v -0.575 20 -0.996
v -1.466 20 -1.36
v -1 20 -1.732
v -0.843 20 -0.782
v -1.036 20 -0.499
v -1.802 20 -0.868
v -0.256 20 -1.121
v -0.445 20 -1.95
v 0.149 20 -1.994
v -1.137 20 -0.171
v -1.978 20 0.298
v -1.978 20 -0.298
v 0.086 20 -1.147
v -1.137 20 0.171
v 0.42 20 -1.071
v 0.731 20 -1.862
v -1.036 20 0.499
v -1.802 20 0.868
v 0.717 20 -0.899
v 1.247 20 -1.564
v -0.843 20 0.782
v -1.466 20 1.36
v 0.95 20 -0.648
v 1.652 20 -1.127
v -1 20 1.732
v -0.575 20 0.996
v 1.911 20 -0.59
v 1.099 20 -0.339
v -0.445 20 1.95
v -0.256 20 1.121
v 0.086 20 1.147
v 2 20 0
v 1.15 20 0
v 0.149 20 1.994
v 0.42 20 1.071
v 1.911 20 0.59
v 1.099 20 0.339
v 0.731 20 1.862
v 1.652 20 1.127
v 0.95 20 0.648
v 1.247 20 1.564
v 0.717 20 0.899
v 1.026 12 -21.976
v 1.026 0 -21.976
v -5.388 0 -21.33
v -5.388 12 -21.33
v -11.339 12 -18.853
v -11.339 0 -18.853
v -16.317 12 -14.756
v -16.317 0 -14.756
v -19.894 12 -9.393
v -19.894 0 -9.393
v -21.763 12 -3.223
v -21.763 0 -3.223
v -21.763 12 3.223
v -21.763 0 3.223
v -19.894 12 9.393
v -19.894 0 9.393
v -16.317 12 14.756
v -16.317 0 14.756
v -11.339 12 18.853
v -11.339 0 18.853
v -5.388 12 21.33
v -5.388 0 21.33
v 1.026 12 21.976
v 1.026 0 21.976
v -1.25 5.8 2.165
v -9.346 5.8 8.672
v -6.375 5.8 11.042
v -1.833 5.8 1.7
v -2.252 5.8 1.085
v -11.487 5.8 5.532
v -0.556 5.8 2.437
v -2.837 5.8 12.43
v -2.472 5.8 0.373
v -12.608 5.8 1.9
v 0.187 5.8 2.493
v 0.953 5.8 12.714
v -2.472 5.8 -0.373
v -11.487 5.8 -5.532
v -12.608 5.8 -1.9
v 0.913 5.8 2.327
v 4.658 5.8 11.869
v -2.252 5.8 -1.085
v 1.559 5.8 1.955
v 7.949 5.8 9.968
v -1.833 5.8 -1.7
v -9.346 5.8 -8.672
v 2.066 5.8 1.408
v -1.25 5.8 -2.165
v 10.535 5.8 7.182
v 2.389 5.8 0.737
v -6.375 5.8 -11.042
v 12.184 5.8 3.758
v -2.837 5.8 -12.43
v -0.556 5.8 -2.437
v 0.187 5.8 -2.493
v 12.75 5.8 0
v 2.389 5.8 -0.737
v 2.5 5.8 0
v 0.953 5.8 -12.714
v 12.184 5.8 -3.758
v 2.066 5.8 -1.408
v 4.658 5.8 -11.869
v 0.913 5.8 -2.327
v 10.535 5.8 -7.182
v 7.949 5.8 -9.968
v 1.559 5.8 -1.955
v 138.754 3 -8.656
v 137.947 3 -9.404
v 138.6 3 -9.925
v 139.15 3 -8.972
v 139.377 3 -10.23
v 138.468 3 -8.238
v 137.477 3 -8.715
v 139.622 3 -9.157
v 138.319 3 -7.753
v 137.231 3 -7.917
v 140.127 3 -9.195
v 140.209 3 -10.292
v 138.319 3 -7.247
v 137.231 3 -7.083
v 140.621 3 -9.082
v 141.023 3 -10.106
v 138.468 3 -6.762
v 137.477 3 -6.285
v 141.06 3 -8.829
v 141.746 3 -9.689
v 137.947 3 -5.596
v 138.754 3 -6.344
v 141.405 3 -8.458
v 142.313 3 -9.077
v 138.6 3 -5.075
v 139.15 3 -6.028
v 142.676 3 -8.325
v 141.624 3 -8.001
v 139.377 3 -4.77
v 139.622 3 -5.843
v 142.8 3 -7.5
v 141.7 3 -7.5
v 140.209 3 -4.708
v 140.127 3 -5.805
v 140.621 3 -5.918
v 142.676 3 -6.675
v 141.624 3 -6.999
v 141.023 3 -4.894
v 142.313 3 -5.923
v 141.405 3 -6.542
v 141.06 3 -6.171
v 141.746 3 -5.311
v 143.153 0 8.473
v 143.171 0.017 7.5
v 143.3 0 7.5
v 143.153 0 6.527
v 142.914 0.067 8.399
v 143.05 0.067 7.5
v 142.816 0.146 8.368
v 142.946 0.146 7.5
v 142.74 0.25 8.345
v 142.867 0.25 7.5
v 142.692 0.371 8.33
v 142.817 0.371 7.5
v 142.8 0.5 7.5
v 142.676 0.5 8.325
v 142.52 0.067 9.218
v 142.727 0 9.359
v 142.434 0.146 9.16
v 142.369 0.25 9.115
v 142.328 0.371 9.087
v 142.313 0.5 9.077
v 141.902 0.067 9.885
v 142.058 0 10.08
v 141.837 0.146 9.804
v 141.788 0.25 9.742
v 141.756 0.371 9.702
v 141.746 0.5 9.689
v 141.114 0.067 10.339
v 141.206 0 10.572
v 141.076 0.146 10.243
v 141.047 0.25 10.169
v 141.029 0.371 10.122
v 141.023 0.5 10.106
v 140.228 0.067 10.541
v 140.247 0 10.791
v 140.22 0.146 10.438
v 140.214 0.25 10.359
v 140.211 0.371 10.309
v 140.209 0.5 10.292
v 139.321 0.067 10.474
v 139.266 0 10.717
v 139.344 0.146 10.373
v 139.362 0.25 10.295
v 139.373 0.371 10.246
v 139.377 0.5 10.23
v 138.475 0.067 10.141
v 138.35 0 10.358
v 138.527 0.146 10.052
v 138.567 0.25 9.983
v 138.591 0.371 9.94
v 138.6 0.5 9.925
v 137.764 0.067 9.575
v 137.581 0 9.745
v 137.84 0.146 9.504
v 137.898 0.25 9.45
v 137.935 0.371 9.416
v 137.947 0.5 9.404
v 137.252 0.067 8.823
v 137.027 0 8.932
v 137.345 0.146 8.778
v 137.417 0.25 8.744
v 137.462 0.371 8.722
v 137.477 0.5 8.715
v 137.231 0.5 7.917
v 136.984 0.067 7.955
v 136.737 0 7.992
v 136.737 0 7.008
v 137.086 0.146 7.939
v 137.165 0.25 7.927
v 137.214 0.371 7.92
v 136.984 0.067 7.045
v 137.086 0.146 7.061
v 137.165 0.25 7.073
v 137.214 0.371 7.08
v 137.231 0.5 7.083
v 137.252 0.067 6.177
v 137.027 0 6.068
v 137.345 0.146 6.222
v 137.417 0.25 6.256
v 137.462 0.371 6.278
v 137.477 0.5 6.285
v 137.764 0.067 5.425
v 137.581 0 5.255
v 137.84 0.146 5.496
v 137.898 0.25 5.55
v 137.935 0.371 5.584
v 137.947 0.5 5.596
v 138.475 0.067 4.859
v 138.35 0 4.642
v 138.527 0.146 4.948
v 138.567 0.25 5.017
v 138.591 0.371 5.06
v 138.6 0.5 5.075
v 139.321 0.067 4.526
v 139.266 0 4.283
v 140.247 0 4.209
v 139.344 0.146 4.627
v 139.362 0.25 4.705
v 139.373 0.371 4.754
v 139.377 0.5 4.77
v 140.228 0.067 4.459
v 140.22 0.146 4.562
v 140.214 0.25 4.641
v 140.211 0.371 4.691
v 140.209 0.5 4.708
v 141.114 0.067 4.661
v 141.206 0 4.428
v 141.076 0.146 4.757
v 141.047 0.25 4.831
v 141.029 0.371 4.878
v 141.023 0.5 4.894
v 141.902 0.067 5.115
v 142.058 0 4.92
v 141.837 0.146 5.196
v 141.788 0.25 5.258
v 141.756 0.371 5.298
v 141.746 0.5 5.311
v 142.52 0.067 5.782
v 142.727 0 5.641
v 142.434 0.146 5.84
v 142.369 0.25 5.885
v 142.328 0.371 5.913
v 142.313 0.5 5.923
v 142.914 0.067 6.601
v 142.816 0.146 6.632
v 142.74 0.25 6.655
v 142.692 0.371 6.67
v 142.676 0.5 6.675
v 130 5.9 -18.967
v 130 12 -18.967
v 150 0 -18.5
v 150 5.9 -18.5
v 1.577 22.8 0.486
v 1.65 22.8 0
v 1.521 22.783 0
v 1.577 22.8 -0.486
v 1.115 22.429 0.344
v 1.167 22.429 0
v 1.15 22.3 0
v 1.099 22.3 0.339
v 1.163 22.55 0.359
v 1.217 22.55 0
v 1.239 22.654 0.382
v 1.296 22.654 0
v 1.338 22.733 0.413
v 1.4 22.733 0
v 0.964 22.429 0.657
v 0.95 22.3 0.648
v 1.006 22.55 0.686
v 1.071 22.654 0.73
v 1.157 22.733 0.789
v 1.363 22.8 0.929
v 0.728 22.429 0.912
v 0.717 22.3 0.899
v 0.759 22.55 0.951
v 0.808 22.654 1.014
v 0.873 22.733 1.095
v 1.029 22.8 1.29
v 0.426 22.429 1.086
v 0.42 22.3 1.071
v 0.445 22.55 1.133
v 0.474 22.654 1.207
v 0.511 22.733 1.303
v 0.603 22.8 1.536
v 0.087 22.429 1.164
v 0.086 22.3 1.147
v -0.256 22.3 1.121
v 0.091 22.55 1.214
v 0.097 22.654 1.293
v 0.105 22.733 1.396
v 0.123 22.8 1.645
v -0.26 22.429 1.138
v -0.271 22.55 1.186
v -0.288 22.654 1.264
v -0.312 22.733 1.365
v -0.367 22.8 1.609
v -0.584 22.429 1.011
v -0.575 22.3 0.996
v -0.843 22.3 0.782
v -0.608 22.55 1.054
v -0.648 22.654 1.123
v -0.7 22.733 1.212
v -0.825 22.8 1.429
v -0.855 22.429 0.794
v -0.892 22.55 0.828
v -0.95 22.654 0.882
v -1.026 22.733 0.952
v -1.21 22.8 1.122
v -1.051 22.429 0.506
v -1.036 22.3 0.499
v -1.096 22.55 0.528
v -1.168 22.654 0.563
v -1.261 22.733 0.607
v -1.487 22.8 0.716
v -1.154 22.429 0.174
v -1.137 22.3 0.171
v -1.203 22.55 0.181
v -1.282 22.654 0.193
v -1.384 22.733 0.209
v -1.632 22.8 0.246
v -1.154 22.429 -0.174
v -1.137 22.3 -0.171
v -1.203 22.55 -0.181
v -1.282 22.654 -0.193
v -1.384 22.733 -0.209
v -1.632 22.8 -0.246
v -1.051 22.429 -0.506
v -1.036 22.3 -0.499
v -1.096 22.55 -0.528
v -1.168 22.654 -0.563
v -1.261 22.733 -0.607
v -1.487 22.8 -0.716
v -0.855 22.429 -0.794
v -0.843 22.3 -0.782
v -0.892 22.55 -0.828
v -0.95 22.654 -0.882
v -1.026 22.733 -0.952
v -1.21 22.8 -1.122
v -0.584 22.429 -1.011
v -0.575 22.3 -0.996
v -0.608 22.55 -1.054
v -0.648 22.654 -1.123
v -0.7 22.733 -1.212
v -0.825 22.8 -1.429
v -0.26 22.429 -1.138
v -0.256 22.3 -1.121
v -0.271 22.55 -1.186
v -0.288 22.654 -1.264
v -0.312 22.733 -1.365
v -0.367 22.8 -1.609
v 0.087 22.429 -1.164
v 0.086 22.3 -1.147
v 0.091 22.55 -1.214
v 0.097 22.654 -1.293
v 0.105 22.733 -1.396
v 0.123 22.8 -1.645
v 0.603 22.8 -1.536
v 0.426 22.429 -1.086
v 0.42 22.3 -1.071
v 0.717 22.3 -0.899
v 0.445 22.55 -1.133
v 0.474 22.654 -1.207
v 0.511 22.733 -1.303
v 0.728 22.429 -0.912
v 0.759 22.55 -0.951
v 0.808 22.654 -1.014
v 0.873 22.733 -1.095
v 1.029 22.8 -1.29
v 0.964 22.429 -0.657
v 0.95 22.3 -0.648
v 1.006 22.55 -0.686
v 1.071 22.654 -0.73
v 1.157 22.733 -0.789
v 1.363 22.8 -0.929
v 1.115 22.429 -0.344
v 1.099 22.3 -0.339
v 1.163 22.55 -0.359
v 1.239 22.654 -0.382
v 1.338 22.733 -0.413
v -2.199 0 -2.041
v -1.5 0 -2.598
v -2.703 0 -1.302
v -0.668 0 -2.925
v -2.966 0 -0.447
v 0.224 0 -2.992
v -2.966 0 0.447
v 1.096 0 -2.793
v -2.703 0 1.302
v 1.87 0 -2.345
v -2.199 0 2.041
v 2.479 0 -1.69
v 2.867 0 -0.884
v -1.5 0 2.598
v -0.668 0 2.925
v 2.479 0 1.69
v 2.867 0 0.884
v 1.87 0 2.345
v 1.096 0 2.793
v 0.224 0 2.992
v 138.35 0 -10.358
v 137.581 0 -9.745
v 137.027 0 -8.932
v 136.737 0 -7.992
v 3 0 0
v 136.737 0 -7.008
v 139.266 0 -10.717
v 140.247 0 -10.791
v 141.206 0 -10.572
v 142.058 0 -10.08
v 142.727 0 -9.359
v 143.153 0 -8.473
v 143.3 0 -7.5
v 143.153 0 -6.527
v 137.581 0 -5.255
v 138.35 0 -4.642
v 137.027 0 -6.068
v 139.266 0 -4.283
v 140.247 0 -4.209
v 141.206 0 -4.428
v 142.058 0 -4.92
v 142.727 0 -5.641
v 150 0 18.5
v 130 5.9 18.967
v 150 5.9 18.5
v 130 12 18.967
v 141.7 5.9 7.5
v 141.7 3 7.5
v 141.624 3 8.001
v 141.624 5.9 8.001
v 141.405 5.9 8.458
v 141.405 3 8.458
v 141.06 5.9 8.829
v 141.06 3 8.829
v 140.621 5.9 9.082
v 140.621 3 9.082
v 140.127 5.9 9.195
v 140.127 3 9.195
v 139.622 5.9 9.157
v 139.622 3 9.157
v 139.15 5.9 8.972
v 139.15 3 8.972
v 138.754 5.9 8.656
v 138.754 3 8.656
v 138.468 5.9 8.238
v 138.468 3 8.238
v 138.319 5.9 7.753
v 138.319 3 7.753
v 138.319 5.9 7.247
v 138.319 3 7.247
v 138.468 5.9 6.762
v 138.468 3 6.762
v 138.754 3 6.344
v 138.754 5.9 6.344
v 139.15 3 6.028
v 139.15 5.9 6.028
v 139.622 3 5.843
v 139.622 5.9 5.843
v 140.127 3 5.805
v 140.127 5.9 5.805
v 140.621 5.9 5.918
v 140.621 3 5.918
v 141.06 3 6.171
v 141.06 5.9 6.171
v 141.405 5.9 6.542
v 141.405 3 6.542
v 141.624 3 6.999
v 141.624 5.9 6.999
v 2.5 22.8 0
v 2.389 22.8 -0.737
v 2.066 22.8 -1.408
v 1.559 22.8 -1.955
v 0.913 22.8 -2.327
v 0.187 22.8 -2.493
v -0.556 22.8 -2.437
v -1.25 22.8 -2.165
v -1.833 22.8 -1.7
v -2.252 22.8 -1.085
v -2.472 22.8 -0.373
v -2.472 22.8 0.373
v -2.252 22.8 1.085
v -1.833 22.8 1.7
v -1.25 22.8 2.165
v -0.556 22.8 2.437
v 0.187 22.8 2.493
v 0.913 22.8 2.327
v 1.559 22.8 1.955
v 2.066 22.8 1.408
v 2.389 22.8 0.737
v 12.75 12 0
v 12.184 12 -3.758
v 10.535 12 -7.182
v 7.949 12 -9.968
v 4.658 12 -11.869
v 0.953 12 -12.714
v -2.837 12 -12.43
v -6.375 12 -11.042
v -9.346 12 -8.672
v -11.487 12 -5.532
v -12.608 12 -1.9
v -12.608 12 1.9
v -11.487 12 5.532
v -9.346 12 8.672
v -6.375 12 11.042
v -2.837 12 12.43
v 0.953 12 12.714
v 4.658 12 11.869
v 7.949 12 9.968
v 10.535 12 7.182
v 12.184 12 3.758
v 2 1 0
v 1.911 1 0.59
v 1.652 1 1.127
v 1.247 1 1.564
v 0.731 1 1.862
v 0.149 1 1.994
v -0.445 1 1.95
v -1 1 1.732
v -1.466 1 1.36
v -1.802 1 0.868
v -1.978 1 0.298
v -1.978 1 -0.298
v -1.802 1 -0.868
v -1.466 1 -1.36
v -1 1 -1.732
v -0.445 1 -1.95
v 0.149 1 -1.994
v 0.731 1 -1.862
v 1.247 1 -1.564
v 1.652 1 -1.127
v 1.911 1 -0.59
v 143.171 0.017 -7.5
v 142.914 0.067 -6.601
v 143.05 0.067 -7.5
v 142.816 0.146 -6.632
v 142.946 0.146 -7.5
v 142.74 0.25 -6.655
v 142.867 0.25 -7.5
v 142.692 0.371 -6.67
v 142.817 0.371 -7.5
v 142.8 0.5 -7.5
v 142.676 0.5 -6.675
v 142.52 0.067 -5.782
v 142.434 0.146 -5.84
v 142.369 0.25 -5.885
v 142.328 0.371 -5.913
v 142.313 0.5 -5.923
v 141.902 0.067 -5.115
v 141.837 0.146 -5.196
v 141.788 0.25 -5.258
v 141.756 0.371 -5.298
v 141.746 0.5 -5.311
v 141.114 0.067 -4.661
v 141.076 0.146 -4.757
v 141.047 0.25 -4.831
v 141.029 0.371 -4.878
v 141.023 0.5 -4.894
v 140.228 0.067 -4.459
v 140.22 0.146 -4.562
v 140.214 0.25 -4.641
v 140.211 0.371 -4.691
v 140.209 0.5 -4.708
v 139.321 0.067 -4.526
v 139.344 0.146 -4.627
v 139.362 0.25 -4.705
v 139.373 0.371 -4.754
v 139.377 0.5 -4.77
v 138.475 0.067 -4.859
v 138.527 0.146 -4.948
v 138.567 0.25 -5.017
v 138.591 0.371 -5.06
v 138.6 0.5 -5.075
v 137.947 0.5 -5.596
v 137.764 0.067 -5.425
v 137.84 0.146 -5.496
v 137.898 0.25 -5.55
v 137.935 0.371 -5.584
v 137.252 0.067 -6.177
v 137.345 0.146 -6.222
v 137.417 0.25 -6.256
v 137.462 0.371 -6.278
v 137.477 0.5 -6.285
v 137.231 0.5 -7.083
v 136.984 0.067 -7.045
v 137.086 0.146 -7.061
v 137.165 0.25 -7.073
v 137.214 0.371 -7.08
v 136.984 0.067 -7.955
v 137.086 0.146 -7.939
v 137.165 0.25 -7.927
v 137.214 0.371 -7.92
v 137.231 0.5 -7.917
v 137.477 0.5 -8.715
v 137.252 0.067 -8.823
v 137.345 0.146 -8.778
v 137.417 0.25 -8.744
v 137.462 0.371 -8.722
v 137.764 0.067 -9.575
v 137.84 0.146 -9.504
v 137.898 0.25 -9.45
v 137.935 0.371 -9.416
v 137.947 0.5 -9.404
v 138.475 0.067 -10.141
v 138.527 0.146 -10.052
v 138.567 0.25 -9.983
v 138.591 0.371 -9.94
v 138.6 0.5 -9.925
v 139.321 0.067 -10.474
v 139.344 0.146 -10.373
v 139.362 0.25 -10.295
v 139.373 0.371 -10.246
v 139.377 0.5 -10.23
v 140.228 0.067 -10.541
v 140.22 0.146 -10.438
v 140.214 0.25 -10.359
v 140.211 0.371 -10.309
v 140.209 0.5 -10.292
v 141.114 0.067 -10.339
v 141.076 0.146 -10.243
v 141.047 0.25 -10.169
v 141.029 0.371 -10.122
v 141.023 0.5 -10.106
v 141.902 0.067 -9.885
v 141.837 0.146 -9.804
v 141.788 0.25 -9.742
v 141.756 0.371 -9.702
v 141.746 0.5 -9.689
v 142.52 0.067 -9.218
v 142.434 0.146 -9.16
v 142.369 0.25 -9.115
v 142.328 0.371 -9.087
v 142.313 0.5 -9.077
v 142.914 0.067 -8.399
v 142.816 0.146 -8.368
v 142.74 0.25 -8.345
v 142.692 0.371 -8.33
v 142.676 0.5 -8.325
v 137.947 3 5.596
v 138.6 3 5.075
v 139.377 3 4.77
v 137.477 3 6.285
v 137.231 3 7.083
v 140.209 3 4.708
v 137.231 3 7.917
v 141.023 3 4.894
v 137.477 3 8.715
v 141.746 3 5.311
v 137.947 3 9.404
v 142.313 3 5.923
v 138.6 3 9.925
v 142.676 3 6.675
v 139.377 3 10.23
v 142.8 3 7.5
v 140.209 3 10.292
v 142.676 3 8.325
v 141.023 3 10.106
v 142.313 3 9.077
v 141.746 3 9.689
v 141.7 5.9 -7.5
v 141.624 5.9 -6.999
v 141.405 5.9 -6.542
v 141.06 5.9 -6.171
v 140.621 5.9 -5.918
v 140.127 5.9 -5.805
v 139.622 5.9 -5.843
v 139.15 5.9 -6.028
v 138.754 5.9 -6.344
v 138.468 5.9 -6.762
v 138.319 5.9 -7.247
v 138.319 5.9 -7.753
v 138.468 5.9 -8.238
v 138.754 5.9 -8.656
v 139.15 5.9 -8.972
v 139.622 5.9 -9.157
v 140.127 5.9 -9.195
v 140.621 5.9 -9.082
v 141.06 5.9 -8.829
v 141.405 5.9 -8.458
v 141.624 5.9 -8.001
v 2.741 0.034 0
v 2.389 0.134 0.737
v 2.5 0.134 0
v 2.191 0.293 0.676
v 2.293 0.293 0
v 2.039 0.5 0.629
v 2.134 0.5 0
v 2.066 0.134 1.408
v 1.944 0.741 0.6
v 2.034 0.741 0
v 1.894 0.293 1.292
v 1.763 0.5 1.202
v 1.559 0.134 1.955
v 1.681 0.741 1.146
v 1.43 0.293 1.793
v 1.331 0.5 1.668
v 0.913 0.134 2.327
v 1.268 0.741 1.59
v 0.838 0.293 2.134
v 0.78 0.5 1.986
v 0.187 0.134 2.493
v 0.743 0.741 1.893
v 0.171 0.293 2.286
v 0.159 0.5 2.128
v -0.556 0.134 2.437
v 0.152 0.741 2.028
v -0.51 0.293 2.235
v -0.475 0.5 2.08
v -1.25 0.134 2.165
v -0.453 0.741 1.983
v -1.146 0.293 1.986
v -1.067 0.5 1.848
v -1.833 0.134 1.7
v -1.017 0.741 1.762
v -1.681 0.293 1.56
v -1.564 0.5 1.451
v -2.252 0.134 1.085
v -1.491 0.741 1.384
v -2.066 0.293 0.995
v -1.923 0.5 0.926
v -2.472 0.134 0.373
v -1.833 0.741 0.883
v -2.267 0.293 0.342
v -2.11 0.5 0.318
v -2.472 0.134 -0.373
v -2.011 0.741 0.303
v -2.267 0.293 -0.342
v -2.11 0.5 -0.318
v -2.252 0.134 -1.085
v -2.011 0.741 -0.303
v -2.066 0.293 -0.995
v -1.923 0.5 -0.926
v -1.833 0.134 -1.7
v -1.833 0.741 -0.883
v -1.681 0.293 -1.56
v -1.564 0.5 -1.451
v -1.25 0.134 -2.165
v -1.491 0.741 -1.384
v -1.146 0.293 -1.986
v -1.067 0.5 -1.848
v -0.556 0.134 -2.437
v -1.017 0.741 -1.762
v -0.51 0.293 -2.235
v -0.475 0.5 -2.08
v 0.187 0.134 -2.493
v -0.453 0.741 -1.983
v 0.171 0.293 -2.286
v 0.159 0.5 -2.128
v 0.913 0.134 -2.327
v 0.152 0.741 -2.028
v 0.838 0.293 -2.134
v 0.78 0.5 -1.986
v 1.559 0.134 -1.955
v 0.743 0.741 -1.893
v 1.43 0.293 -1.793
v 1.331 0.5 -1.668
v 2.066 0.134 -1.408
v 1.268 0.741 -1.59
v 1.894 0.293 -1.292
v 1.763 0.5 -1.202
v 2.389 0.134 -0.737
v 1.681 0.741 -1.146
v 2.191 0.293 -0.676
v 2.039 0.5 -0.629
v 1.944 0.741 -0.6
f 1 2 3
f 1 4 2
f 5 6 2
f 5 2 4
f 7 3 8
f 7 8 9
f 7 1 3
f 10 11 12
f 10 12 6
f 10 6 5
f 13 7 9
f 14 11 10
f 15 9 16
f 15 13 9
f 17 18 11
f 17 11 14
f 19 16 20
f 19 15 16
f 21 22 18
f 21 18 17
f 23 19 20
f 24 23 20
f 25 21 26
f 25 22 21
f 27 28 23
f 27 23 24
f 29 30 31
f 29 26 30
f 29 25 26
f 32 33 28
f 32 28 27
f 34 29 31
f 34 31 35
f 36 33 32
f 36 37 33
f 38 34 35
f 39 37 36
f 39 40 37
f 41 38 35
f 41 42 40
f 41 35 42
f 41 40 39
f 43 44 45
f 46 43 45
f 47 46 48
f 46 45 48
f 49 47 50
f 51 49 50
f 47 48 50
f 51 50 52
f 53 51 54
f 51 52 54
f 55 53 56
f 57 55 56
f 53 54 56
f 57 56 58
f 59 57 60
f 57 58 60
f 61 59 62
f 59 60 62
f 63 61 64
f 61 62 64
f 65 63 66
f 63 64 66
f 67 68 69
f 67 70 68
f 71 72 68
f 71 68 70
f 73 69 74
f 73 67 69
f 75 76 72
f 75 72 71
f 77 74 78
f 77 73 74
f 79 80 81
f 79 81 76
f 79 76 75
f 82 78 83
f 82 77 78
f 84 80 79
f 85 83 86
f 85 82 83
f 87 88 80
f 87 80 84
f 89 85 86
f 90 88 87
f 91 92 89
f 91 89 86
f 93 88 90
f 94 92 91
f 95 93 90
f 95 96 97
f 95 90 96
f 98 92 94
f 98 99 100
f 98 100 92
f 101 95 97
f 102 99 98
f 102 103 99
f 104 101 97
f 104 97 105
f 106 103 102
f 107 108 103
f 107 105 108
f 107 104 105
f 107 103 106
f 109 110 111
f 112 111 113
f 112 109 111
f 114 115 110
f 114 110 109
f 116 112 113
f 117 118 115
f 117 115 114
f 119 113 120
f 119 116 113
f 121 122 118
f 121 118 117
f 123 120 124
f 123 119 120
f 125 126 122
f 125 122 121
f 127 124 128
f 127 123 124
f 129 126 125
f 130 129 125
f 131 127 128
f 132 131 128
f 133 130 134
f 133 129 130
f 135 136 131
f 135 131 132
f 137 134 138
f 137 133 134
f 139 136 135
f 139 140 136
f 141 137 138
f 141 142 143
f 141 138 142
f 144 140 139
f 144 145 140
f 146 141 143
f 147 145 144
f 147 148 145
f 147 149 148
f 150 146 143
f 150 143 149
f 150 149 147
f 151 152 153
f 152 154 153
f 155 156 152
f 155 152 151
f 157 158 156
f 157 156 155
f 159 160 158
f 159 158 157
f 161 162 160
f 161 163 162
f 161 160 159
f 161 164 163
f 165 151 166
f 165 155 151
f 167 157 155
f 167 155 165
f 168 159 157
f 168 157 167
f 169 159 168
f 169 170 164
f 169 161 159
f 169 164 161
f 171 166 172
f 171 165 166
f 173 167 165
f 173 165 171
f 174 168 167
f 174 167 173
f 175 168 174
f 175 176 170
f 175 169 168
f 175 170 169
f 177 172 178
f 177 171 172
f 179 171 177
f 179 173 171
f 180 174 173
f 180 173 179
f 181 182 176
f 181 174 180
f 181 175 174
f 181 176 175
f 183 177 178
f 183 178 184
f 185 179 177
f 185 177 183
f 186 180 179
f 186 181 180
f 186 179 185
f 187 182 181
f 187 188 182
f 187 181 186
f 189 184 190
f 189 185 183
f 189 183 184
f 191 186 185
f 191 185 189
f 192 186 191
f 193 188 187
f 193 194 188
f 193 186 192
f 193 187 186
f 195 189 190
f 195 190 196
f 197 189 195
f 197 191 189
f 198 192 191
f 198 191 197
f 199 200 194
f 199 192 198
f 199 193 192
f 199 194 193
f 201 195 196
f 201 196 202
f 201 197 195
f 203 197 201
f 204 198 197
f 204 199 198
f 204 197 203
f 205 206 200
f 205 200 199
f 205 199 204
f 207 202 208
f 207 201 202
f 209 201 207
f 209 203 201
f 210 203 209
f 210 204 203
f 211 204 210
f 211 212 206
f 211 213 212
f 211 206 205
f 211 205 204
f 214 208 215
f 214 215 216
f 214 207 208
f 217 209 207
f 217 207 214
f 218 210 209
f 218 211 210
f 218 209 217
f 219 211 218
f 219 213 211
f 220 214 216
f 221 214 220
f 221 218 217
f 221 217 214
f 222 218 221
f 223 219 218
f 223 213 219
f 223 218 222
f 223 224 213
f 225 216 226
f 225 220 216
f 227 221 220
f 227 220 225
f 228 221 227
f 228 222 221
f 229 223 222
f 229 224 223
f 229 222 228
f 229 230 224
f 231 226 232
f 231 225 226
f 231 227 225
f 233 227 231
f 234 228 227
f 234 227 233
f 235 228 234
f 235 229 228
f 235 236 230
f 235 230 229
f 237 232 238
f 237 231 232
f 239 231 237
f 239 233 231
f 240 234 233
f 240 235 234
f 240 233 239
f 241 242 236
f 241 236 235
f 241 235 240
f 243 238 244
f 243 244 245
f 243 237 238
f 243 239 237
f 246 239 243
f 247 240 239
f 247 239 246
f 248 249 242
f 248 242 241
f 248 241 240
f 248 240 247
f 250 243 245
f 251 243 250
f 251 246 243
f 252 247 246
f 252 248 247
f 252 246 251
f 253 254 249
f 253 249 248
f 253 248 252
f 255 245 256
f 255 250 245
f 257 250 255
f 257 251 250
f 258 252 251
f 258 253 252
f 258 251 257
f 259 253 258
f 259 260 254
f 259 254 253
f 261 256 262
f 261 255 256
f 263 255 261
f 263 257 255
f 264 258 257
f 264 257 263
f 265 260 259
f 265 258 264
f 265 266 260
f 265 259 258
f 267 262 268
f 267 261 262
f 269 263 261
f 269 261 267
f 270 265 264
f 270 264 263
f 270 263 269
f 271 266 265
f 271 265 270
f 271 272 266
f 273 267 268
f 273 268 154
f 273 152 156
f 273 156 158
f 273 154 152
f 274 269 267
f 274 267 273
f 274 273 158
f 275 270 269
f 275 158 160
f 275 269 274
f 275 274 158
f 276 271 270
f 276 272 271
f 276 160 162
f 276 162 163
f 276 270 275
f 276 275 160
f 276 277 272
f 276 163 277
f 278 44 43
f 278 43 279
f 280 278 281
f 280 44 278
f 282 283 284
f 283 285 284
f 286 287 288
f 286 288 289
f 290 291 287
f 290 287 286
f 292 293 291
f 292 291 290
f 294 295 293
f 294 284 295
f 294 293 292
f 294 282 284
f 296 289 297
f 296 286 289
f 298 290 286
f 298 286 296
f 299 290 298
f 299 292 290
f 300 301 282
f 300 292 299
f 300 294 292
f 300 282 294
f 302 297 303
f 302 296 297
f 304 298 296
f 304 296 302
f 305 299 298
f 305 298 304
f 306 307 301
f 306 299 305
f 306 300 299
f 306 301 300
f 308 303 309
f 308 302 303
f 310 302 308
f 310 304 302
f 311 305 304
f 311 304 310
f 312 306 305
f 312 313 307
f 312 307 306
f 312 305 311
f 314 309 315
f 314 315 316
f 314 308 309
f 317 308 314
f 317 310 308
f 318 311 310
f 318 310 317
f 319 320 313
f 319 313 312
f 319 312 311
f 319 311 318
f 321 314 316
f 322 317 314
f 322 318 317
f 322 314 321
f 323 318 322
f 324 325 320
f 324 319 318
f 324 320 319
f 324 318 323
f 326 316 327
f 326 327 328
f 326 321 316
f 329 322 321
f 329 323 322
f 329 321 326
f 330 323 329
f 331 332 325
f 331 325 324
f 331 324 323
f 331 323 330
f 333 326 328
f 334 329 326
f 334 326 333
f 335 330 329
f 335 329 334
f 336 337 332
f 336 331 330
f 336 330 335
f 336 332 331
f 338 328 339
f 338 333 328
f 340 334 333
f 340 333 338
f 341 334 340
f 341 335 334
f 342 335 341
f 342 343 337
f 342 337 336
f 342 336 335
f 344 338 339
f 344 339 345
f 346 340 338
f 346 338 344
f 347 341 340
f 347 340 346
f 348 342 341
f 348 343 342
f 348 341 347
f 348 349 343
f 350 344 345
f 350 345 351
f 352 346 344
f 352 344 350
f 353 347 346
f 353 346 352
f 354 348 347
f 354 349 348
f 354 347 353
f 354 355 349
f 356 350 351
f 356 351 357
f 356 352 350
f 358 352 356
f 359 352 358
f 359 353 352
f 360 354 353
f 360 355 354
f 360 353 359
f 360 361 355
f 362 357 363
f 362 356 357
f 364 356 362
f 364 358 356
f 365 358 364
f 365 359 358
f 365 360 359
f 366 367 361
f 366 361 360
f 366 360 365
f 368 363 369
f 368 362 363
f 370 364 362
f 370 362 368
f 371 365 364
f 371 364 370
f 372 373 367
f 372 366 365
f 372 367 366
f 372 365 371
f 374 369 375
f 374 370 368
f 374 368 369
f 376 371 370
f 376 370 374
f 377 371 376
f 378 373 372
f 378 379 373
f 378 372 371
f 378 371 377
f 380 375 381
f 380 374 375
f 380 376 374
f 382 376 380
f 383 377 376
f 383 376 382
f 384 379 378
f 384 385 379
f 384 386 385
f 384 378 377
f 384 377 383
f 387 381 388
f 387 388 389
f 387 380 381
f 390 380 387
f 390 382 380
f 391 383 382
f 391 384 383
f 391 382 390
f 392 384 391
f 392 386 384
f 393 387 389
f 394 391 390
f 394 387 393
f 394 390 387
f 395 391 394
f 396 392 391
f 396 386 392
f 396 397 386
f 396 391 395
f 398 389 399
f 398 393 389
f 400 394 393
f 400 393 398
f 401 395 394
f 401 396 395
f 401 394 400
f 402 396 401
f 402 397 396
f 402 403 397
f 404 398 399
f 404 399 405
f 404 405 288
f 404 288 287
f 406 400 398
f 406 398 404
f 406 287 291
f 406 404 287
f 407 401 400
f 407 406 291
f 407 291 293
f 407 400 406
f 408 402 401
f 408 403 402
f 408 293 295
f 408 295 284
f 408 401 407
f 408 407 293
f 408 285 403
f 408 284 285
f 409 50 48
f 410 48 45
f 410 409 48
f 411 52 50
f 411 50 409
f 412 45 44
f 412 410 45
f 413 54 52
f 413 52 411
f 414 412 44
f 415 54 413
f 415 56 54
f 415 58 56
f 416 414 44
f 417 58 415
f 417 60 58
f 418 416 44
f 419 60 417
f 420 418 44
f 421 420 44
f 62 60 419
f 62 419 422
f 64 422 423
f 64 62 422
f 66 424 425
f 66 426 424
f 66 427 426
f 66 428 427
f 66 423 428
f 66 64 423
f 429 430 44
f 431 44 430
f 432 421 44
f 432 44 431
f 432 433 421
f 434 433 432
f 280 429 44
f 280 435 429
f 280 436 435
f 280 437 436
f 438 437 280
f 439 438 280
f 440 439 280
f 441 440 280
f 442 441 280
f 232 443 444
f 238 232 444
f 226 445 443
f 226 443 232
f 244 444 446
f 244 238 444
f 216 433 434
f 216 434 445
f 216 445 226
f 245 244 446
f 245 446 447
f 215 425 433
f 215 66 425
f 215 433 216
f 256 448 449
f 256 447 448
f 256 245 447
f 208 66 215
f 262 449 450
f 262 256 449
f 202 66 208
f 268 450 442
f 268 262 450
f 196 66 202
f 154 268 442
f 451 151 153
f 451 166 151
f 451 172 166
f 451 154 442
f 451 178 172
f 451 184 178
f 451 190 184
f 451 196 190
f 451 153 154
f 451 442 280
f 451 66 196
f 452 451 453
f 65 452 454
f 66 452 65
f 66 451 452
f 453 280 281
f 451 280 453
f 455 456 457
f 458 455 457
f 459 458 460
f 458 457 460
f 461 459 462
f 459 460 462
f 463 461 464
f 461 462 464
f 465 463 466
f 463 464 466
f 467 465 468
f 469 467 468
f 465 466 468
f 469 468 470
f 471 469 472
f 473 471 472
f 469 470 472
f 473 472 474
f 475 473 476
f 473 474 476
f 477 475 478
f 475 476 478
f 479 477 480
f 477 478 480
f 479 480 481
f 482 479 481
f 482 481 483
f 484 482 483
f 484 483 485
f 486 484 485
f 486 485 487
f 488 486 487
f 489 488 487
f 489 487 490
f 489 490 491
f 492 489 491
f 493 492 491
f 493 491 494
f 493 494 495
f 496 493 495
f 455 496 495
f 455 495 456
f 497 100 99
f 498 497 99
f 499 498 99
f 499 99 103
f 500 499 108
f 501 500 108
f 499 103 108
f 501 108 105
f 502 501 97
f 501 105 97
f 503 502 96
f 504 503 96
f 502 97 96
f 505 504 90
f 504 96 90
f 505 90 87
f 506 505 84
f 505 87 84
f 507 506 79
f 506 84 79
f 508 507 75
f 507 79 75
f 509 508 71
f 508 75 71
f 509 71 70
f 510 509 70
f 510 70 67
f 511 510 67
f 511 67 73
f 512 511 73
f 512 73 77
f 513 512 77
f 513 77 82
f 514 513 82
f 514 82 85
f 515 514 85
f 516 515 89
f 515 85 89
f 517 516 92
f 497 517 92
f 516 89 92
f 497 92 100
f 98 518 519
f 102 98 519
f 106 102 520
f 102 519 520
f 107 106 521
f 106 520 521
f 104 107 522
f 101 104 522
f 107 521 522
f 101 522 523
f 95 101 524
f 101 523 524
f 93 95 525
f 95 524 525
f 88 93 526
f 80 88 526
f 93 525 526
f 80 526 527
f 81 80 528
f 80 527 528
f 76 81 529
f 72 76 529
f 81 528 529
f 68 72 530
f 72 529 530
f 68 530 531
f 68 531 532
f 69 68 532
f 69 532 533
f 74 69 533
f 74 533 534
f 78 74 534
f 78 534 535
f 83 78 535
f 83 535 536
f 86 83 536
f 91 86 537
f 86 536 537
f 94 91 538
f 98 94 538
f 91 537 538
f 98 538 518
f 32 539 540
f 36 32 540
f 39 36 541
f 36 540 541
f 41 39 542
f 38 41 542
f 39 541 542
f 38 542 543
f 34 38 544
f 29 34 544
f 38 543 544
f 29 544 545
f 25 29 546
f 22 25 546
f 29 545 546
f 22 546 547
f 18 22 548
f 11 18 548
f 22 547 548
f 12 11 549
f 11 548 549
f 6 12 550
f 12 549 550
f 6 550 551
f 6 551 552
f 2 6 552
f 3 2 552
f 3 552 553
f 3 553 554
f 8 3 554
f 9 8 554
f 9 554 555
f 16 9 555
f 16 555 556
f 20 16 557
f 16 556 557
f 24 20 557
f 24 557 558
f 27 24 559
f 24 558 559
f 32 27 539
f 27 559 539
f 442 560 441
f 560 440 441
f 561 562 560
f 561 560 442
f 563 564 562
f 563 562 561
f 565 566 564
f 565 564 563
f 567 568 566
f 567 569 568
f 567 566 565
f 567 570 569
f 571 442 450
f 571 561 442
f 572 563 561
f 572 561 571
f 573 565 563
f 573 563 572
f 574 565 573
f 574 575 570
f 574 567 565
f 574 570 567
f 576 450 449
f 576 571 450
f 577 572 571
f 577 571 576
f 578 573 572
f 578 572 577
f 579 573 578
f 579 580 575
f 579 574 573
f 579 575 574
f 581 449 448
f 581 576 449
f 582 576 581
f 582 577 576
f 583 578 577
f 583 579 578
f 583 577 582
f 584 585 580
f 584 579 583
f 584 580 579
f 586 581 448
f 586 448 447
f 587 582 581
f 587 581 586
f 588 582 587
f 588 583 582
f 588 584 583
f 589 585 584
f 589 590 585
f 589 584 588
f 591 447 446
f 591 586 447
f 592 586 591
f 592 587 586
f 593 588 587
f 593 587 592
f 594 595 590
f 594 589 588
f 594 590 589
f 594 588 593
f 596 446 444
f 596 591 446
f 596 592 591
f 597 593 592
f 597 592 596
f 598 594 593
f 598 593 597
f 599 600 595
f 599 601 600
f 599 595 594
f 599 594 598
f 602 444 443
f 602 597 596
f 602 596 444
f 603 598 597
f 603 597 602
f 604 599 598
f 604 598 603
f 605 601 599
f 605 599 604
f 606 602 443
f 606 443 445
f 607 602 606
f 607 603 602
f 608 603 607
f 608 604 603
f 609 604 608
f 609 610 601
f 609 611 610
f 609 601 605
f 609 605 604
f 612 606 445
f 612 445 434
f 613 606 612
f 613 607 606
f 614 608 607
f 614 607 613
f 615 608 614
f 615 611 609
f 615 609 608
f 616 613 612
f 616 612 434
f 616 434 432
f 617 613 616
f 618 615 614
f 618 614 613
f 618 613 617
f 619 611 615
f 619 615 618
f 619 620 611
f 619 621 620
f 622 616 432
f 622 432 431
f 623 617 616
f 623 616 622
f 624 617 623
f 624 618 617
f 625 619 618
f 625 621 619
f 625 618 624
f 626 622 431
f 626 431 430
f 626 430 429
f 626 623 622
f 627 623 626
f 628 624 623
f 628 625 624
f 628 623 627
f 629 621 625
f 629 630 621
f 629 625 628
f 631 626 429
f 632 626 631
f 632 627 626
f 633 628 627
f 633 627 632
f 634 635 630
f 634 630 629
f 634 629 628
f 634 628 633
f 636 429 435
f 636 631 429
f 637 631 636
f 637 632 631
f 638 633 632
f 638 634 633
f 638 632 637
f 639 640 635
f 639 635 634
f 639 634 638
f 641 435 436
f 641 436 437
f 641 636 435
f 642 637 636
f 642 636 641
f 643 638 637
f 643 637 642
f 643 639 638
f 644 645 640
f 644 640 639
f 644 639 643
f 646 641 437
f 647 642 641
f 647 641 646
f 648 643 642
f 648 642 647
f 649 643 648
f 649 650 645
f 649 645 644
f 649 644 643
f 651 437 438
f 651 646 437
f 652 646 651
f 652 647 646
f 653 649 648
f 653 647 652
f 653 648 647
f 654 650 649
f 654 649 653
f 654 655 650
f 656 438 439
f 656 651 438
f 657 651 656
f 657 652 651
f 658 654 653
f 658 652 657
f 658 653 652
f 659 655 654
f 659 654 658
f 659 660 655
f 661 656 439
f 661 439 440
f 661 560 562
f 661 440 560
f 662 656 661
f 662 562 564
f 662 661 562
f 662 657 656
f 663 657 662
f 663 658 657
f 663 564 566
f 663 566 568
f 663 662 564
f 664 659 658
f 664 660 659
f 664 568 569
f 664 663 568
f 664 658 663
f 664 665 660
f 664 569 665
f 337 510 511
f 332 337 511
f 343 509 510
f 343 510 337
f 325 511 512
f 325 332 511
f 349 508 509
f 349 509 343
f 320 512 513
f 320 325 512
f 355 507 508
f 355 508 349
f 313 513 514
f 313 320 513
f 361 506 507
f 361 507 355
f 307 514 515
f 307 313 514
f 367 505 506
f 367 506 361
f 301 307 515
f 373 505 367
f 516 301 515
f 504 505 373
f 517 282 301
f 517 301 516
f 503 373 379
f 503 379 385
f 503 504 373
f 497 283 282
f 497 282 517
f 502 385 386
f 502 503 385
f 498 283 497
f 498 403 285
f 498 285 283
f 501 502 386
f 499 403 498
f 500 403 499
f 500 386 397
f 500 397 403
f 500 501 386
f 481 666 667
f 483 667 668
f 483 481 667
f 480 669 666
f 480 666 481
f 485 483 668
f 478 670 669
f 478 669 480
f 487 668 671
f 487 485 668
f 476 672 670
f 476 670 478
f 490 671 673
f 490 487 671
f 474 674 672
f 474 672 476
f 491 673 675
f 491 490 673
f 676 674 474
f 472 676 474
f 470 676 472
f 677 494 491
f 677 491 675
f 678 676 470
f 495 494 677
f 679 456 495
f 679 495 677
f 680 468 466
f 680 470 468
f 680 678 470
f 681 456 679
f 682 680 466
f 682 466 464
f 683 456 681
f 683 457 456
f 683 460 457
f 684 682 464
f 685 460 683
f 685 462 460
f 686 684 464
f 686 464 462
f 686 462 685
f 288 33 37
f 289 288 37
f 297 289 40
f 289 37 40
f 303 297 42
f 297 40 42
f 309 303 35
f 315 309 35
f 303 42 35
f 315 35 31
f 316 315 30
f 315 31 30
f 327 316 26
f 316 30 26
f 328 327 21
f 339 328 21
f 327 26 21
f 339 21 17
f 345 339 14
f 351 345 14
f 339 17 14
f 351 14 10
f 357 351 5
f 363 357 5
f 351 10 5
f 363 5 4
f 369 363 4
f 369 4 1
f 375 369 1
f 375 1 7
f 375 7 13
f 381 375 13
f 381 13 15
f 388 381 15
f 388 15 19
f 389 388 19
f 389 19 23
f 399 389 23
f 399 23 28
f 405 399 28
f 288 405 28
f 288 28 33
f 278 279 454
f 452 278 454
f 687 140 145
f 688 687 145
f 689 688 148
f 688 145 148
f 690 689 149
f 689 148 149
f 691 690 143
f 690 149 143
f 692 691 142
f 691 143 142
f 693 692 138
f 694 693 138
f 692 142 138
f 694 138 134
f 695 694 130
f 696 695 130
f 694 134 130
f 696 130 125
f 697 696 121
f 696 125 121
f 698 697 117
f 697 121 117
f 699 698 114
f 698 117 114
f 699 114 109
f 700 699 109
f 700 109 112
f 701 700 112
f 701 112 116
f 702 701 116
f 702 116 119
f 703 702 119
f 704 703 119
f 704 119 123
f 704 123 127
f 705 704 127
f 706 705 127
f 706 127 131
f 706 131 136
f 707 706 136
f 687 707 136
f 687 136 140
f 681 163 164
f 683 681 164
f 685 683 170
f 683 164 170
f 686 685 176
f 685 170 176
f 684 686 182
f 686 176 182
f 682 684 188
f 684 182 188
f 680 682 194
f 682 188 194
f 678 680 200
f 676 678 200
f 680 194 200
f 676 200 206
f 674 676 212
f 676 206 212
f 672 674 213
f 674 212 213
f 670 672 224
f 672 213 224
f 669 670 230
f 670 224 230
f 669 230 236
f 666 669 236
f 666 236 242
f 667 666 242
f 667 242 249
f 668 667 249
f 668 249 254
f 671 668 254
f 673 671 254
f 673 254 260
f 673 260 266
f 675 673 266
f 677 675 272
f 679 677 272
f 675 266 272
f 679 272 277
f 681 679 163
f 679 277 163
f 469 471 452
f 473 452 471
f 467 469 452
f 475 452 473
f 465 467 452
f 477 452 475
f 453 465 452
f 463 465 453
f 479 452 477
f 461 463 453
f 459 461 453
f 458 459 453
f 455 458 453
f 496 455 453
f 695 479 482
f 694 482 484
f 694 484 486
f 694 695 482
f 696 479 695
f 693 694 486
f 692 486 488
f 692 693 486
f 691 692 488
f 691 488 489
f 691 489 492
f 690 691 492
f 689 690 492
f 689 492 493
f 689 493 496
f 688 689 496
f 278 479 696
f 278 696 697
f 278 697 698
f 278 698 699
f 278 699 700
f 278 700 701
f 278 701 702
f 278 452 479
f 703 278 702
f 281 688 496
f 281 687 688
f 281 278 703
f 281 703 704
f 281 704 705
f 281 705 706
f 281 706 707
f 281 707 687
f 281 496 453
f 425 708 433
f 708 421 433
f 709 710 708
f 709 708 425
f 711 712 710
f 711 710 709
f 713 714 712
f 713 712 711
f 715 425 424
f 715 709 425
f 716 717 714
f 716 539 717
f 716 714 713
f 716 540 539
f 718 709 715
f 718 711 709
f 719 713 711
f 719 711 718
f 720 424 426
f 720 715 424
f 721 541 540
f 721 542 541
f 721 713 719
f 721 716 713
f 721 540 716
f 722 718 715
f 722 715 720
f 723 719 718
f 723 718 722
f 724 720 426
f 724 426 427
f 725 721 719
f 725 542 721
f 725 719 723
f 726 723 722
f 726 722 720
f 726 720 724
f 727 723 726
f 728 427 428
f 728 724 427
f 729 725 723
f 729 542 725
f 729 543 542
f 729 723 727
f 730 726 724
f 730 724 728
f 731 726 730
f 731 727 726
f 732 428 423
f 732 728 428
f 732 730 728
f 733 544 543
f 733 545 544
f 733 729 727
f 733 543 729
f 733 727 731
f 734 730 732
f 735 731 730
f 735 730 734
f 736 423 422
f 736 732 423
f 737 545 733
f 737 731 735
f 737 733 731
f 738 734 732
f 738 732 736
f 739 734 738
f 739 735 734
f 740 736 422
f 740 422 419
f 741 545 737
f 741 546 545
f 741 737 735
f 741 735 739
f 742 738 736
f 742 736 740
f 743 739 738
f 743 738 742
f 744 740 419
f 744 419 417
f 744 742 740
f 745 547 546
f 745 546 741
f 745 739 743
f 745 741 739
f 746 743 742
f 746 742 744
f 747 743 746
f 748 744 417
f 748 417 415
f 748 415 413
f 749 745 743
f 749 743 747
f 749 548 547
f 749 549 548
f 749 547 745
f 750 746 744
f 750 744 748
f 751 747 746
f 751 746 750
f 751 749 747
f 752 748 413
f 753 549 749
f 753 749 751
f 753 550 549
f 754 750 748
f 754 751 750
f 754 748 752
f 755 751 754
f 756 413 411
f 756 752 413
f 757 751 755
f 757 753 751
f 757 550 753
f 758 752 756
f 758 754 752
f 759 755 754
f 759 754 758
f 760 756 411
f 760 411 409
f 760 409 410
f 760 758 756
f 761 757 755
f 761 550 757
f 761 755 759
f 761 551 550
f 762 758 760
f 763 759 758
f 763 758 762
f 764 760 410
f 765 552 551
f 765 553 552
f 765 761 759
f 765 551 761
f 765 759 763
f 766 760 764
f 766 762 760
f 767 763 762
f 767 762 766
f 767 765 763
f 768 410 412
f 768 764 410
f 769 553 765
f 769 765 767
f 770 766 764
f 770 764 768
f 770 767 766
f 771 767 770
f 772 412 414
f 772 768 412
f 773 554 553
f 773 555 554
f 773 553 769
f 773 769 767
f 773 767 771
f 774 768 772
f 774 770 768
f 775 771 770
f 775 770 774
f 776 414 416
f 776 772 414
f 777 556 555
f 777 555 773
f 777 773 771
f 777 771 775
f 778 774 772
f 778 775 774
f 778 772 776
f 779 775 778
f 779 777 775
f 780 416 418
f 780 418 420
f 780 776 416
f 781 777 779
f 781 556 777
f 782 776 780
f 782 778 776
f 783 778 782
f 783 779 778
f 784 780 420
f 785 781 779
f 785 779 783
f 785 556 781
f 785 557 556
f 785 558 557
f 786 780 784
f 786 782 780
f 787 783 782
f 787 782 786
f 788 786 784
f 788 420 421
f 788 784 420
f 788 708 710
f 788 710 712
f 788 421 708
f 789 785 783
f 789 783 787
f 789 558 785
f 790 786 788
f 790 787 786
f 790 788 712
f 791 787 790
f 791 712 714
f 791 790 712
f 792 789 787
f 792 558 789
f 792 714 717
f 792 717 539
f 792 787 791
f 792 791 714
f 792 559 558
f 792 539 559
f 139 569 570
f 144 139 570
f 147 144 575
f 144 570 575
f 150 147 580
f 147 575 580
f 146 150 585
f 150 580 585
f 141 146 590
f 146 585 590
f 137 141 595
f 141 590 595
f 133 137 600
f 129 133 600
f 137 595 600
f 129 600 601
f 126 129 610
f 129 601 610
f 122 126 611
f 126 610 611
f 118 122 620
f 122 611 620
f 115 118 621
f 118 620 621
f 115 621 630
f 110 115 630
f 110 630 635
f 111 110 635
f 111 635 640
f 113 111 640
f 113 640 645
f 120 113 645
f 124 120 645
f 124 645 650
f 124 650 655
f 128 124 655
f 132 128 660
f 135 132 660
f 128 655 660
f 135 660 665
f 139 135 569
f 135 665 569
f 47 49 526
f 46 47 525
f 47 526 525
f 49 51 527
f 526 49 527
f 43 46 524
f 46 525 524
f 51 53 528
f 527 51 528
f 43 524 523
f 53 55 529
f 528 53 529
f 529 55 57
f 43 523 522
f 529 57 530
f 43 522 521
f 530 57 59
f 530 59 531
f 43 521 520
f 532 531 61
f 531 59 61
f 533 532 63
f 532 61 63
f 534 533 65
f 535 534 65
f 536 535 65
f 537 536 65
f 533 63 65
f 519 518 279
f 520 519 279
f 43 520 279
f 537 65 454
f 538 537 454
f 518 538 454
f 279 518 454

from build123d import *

# Parameters (mm, degrees)
SKETCH1_R           = 22
BOSS_EXTRUDE1_DEPTH = 12
SKETCH2_R           = 12.75
CUT_EXTRUDE1_DEPTH  = 6.2
SKETCH5_R           = 2.5
BOSS_EXTRUDE2_DEPTH = 17
SKETCH6_R           = 1.15
CUT_EXTRUDE2_DEPTH  = 34.1
SKETCH7_R           = 2
CUT_EXTRUDE3_DEPTH  = 20
FILLET1_R           = 1
FILLET2_R           = 0.5
BOSS_EXTRUDE4_DEPTH = 12
CUT_EXTRUDE5_DEPTH  = 6.1
SKETCH10_R          = 1.7
CUT_EXTRUDE6_DEPTH  = 6.1
SKETCH11_R          = 2.8
CUT_EXTRUDE7_DEPTH  = 3
FILLET3_R           = 0.5


with BuildPart() as part:
    # Sketch1 → Boss-Extrude1 (new body)
    with BuildSketch(Plane(origin=(0, 0, 0), x_dir=(1, 0, 0), z_dir=(0, 1, 0))):
        Circle(SKETCH1_R)
    extrude(amount=BOSS_EXTRUDE1_DEPTH)

    # Sketch2 → Cut-Extrude1 (cut)
    with BuildSketch(Plane(origin=(0, 12, 0), x_dir=(1, 0, 0), z_dir=(0, 1, 0))):
        Circle(SKETCH2_R)
    extrude(amount=-CUT_EXTRUDE1_DEPTH, mode=Mode.SUBTRACT)

    # Sketch5 → Boss-Extrude2 (add)
    with BuildSketch(Plane(origin=(0, 5.8, 0), x_dir=(1, 0, 0), z_dir=(0, 1, 0))):
        Circle(SKETCH5_R)
    extrude(amount=BOSS_EXTRUDE2_DEPTH)

    # Sketch6 → Cut-Extrude2 (cut)
    with BuildSketch(Plane.XZ):
        Circle(SKETCH6_R)
    extrude(amount=-CUT_EXTRUDE2_DEPTH, mode=Mode.SUBTRACT)

    # Sketch7 → Cut-Extrude3 (cut)
    with BuildSketch(Plane.XZ):
        Circle(SKETCH7_R)
    extrude(amount=-CUT_EXTRUDE3_DEPTH, mode=Mode.SUBTRACT)

    # Fillet1
    fillet1_edges = [part.edges().sort_by_distance(p)[0] for p in [
        (-2, 0, 0),
    ]]
    fillet(fillet1_edges, radius=FILLET1_R)

    # Fillet2
    fillet2_edges = [part.edges().sort_by_distance(p)[0] for p in [
        (-1.15, 22.8, 0),
    ]]
    fillet(fillet2_edges, radius=FILLET2_R)

    # Sketch8 → Boss-Extrude4 (add)
    with BuildSketch(Plane.XZ):
        with BuildLine():
            Line((1.026108008, -21.97605748), (150, -18.5))
            Line((150, -18.5), (150, 18.5))
            Line((150, 18.5), (1.026108008, 21.97605748))
            ThreePointArc((1.026108008, 21.97605748), (22, 0), (1.026108008, -21.97605748))
        make_face()
    extrude(amount=-BOSS_EXTRUDE4_DEPTH)

    # Sketch9 → Cut-Extrude5 (cut)
    with BuildSketch(Plane(origin=(0, 12, 0), x_dir=(1, 0, 0), z_dir=(0, 1, 0))):
        Polygon((150, 18.5), (130, 18.966666667), (130, -18.966666667), (150, -18.5), align=None)
    extrude(amount=-CUT_EXTRUDE5_DEPTH, mode=Mode.SUBTRACT)

    # Sketch10 → Cut-Extrude6 (cut)
    with BuildSketch(Plane.XZ):
        with Locations((140, -7.5)):
            Circle(SKETCH10_R)
        with Locations((140, 7.5)):
            Circle(SKETCH10_R)
    extrude(amount=-CUT_EXTRUDE6_DEPTH, mode=Mode.SUBTRACT)

    # Sketch11 → Cut-Extrude7 (cut)
    with BuildSketch(Plane.XZ):
        with Locations((140, 7.5)):
            Circle(SKETCH11_R)
        with Locations((140, -7.5)):
            Circle(SKETCH11_R)
    extrude(amount=-CUT_EXTRUDE7_DEPTH, mode=Mode.SUBTRACT)

    # Fillet3
    fillet3_edges = [part.edges().sort_by_distance(p)[0] for p in [
        (137.2, 0, 7.5),
        (137.2, 0, -7.5),
    ]]
    fillet(fillet3_edges, radius=FILLET3_R)


solid = part.part
